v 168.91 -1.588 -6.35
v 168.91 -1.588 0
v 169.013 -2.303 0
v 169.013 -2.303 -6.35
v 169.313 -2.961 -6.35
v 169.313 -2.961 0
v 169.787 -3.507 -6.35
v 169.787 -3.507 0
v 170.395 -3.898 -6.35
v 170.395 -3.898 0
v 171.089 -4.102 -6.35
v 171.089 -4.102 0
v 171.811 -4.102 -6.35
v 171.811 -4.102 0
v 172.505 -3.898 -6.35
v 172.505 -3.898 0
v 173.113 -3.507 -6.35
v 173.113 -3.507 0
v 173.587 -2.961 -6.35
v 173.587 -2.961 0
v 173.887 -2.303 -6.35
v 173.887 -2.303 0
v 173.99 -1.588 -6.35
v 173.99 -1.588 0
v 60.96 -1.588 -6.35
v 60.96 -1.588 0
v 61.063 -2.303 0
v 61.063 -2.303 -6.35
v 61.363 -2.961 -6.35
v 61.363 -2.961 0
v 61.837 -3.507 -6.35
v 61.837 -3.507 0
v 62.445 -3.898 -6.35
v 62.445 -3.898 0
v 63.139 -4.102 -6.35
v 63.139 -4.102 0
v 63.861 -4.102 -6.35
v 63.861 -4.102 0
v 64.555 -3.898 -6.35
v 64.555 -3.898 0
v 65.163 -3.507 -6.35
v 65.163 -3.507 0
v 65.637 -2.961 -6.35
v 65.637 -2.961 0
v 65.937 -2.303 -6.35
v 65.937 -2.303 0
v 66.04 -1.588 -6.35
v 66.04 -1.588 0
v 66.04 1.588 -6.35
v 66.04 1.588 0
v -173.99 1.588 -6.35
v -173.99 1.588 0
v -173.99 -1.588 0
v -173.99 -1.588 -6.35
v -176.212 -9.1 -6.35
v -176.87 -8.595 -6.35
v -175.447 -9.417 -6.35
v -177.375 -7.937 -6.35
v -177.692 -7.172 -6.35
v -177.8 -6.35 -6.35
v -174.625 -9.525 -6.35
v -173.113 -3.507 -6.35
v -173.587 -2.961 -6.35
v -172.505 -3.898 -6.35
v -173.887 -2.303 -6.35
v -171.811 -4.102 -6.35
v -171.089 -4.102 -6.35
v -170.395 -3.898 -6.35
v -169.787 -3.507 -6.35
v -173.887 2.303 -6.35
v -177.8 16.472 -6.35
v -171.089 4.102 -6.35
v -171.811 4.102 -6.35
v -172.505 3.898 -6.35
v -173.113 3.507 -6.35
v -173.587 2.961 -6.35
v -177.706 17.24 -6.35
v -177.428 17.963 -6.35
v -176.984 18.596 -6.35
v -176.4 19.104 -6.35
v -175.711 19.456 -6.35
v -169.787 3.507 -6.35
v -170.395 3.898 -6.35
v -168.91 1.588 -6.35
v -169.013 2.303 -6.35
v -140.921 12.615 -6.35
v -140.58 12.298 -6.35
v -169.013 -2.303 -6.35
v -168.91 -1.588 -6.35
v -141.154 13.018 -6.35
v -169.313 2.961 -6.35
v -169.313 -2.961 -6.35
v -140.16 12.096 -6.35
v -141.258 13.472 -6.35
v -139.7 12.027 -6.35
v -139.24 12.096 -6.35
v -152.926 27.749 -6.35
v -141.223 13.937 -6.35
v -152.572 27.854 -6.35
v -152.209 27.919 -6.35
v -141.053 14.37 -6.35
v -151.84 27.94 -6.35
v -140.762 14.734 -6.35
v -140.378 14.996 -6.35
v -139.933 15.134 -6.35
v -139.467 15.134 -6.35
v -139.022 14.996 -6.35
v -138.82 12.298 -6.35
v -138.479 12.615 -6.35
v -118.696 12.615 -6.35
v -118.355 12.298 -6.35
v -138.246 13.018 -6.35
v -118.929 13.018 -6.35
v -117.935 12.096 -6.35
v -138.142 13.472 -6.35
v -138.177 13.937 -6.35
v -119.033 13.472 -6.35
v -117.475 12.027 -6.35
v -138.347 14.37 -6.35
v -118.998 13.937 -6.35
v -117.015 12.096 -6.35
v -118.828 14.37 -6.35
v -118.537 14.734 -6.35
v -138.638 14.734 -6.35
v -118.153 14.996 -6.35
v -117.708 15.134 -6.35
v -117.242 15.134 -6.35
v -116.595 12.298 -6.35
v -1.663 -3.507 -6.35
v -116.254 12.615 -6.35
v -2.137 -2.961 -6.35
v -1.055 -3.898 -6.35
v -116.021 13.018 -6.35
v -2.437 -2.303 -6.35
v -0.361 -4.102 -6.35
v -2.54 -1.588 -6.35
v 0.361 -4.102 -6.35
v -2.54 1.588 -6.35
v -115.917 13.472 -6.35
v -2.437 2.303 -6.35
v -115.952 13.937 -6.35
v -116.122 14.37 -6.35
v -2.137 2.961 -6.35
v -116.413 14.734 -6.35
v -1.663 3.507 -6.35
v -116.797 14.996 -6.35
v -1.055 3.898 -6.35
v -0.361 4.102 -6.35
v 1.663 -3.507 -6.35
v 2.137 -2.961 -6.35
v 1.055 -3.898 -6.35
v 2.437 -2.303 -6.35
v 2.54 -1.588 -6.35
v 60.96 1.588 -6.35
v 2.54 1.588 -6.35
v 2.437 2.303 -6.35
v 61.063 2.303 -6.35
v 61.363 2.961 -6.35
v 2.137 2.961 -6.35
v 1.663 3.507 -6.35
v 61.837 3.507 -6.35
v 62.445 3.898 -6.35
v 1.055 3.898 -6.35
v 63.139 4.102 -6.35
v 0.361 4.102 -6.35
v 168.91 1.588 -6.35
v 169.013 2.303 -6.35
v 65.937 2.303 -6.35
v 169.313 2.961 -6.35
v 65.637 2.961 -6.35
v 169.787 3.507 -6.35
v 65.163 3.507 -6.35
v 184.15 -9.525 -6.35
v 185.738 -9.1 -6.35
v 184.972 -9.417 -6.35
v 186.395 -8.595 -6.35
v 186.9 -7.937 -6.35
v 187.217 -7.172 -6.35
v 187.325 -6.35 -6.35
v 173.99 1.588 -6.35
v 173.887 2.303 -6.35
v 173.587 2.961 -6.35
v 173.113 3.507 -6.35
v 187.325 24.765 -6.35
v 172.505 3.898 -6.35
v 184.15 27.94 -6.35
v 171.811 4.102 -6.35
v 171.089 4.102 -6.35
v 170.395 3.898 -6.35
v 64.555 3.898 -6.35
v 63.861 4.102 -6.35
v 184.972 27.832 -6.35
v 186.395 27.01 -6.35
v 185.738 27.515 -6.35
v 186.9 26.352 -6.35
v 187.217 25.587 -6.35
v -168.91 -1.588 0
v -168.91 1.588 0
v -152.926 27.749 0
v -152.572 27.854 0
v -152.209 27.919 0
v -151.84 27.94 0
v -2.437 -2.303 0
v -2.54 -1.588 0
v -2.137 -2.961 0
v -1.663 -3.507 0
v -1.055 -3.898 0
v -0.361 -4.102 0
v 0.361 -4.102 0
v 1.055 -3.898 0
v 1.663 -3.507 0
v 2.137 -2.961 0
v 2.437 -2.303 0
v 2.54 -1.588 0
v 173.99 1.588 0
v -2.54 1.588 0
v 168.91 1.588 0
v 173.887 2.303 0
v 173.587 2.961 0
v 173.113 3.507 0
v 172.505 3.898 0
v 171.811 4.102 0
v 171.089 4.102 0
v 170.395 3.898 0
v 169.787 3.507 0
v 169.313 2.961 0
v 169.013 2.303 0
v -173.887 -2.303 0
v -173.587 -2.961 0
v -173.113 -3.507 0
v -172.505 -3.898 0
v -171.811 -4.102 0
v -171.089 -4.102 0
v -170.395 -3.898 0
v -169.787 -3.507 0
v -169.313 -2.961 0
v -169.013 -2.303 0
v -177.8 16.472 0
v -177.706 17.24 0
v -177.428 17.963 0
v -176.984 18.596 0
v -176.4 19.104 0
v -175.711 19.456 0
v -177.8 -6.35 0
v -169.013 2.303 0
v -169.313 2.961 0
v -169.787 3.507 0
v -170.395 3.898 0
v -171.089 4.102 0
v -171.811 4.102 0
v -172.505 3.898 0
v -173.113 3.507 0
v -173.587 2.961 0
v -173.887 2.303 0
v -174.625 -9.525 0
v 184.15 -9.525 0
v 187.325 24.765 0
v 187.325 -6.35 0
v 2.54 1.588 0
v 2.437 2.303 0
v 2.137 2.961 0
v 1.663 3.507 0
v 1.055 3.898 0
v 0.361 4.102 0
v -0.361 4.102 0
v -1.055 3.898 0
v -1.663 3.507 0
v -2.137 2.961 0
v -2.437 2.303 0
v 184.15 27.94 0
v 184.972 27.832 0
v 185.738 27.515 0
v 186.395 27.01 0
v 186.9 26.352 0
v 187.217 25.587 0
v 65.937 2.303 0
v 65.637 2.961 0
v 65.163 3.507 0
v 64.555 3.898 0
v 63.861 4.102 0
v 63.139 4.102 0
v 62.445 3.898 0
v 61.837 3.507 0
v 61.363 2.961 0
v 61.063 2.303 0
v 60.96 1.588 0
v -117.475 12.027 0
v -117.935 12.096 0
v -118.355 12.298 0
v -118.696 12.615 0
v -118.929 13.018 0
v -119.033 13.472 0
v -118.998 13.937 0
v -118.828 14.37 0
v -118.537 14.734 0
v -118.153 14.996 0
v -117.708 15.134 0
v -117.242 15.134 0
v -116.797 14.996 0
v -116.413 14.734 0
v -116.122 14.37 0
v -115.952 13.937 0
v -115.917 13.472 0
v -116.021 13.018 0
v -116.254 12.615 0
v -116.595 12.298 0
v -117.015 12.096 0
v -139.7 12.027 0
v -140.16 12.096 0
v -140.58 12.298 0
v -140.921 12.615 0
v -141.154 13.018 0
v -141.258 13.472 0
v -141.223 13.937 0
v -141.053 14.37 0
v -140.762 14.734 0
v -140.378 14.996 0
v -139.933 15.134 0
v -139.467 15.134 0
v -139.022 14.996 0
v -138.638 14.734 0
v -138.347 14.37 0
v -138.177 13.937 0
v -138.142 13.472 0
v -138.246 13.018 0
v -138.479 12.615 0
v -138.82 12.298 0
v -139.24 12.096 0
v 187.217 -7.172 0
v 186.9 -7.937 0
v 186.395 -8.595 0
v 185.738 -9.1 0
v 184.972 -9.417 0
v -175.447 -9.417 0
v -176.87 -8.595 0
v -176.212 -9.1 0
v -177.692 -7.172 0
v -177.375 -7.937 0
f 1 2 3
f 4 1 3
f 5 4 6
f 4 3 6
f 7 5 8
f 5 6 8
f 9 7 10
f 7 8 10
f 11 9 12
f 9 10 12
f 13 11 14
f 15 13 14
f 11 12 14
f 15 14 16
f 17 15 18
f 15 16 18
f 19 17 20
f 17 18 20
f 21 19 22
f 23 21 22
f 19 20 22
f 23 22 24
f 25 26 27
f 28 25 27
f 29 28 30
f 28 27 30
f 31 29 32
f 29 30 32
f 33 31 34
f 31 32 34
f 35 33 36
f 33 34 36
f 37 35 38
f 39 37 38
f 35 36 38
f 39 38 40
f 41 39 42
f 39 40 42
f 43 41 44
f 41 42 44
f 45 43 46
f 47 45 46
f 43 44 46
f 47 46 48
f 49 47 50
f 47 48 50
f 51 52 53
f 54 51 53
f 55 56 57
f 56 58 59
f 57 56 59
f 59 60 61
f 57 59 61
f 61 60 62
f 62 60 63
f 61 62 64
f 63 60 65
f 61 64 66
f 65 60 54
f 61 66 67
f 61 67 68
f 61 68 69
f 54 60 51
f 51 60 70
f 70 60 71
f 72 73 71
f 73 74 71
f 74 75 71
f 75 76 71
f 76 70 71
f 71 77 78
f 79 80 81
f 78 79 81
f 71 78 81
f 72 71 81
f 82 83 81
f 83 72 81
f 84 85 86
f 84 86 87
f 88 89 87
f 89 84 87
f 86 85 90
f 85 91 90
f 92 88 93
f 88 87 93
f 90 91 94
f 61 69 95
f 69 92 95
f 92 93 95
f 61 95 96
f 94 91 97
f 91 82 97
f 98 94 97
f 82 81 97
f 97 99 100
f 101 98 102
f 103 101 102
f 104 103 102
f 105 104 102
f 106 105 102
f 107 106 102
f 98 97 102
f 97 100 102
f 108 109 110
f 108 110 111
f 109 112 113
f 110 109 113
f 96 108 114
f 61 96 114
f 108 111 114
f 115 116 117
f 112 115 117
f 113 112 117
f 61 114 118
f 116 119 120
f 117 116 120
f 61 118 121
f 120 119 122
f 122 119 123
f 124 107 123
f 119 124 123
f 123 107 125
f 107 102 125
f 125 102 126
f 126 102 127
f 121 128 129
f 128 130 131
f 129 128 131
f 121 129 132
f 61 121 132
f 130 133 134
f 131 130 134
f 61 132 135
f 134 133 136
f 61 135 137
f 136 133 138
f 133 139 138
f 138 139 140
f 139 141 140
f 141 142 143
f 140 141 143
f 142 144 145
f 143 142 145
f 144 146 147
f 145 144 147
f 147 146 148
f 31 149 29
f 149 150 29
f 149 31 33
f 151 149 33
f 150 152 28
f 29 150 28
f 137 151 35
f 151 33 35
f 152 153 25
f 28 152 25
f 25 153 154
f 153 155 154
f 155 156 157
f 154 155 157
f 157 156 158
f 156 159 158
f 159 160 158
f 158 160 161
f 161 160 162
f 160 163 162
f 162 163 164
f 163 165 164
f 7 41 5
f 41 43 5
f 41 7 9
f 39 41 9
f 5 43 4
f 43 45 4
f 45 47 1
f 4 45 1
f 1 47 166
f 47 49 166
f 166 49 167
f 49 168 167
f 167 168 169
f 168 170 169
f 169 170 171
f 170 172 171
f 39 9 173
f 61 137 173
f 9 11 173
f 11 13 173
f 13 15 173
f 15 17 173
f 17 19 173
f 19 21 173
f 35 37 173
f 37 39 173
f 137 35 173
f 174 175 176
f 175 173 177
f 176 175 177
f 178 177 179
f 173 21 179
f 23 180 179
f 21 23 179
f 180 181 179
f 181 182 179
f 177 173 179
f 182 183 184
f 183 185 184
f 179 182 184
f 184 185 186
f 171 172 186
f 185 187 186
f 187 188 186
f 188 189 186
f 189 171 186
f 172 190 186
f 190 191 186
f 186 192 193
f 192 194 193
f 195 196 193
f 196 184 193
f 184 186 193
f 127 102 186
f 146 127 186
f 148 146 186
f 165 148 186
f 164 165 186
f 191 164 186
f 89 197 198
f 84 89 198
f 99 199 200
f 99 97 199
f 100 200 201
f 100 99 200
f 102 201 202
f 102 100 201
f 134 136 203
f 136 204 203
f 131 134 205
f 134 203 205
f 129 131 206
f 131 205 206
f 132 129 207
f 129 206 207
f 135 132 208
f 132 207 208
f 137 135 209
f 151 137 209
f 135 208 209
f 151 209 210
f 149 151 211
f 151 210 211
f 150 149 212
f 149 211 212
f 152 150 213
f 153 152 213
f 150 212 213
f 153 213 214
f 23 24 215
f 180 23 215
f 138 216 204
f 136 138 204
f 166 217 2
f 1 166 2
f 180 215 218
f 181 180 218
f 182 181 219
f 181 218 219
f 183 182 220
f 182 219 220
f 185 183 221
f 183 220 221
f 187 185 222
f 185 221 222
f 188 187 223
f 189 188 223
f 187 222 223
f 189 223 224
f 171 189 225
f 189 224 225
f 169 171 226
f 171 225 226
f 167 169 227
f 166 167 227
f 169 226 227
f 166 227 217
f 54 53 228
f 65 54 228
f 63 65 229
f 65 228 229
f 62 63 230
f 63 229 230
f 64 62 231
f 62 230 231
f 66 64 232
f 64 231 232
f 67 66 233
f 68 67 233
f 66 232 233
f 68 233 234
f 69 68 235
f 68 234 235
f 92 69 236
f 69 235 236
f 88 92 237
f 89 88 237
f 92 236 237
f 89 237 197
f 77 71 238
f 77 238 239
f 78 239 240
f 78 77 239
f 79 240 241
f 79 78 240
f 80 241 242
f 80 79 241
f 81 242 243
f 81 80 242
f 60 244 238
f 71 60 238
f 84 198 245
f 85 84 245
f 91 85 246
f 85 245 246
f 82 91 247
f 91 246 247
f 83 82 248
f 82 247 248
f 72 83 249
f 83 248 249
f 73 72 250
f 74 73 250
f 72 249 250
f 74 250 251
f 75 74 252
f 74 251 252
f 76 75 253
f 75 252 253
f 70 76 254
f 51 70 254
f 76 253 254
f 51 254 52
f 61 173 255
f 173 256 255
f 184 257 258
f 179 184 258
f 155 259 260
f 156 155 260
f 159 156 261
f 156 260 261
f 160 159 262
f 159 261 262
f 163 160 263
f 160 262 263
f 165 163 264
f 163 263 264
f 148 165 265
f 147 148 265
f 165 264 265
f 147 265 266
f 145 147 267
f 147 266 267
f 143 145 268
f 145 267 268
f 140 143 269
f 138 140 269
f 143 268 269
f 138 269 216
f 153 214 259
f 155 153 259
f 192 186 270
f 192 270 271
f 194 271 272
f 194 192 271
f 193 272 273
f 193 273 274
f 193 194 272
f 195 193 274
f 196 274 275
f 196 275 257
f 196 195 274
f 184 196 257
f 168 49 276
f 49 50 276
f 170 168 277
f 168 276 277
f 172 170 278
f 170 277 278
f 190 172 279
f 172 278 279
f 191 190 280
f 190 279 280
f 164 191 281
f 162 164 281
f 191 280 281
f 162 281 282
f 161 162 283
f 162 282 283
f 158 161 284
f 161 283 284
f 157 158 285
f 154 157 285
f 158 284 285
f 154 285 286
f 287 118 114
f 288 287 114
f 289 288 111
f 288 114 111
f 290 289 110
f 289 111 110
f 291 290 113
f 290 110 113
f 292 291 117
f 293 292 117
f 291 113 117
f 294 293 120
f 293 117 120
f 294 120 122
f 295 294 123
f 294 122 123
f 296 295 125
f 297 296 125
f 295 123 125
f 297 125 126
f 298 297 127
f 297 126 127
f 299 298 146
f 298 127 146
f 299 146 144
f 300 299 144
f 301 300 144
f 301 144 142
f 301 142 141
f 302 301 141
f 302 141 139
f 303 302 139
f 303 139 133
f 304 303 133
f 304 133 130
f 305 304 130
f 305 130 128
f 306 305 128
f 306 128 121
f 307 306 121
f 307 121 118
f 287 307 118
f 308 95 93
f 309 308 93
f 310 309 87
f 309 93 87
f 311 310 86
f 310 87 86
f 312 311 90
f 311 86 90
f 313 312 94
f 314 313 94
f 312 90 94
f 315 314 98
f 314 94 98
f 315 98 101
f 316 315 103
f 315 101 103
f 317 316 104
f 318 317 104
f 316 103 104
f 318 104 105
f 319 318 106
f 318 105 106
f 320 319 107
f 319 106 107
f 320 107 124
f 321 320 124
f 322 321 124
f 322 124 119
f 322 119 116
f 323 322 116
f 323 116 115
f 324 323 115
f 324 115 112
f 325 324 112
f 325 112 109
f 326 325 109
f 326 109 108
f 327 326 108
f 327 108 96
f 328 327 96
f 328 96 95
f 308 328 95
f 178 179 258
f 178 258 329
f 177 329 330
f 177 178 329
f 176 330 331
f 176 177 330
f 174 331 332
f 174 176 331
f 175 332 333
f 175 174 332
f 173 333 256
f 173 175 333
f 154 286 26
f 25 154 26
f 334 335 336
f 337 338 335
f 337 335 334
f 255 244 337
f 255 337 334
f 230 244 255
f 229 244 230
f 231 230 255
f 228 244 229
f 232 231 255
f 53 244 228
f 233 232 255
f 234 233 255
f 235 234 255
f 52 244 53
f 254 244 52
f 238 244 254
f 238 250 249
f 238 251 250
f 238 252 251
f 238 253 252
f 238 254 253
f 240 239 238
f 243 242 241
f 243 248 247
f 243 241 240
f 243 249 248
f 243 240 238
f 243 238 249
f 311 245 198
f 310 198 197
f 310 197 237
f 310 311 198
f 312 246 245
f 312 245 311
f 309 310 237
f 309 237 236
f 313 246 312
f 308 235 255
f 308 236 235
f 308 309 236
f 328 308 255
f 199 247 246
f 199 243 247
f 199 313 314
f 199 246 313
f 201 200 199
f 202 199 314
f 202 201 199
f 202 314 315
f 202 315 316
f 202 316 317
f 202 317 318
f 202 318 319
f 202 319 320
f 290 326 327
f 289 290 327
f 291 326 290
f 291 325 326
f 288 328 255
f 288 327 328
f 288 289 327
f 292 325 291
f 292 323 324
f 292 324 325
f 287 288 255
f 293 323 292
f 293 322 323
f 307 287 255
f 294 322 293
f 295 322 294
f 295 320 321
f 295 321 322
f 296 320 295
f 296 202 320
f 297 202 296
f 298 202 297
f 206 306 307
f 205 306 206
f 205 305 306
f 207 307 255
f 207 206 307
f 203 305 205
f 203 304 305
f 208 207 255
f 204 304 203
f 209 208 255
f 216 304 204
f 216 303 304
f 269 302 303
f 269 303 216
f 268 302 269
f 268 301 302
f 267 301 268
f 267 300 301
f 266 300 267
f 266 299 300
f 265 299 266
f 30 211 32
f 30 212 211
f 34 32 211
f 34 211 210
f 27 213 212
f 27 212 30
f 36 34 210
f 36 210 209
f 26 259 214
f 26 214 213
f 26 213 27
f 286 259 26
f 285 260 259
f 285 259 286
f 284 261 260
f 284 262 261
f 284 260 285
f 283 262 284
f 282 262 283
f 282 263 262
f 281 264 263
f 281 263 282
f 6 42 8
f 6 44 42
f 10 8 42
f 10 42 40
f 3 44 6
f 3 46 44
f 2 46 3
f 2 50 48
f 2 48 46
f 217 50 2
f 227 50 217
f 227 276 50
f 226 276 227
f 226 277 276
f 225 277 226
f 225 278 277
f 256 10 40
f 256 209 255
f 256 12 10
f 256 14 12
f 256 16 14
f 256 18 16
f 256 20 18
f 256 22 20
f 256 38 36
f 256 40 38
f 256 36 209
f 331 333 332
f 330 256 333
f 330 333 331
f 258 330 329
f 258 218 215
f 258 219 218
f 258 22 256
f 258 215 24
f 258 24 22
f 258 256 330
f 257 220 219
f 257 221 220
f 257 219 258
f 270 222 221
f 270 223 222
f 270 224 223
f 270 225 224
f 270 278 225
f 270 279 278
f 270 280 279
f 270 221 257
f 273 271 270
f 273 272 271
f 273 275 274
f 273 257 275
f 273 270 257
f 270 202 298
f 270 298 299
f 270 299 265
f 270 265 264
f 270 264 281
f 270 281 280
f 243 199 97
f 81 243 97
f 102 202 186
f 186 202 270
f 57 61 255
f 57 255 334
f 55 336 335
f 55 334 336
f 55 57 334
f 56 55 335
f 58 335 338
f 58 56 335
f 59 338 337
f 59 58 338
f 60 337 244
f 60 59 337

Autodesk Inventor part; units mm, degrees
ref_plane "YZ Plane" through (0, 0, 0) normal (1, 0, 0) x (0, 1, 0)
ref_plane "XZ Plane" through (0, 0, 0) normal (0, 1, 0) x (-1, 0, 0)
sketch "Sketch1" plane through (0, 0, 0) normal (0, 0, 1) x (1, 0, 0)
  line L0 (0, 35.433) -> (0, -17.018) projected
  line L1 (-250.825, 0) -> (260.35, 0) projected
  line L2 (187.325, -9.525) -> (-177.8, -9.525)
  line L3 (-177.8, -9.525) -> (-177.8, 27.94)
  line L4 (-177.8, 27.94) -> (187.325, 27.94)
  line L5 (187.325, 27.94) -> (187.325, -9.525)
  point P0 (0, 0)
  point P1 (-171.45, 0)
  point P2 (0, 0)
  point P3 (63.5, 0)
  point P4 (171.45, 0)
  point P5 (-139.7, 13.589)
  point P6 (-117.475, 13.589)
  dimension "d0" = 171.45
  dimension "d1" = 63.5
  dimension "d17" = 27.94
  dimension "d18" = 9.525
  dimension "d19" = 6.35
  dimension "d20" = 187.325
  dimension "d21" = 171.45
  dimension "d33" = 22.225
  dimension "d34" = 14.351
  dimension "d35" = 38.1
extrude "Extrusion1" add sketch "Sketch1" against normal blind 6.35
sketch "Sketch2" plane through (0, 0, -6.35) normal (0, 0, -1) x (-1, 0, 0)
  point P0 (0, 0)
  point P1 (171.45, 0)
  point P2 (0, 0)
  point P3 (-63.5, 0)
  point P4 (-171.45, 0)
chamfer "Chamfer1" distance 25.4 angle 20 1 edges at (-177.8, 27.94, -3.175) measured on face at (-56.0917, 27.94, -2.1167)
fillet "Fillet1" radius 3.175 5 edges at (187.325, 27.94, -3.175) (187.325, -9.525, -3.175) (-177.8, -9.525, -3.175) (-177.8, 18.6952, -3.175) (-152.4, 27.94, -3.175)
hole "Hole2" [suppressed]
sketch "Sketch3" plane through (0, 0, 0) normal (0, 0, 1) x (1, 0, 0)
  line L0 (-171.45, -1.5875) -> (-171.45, 1.5875) construction
  line L1 (-168.91, -1.5875) -> (-168.91, 1.5875)
  line L2 (-173.99, 1.5875) -> (-173.99, -1.5875)
  arc A0 (-173.99, -1.5875) -> (-168.91, -1.5875) centre (-171.45, -1.5875) ccw
  arc A1 (-168.91, 1.5875) -> (-173.99, 1.5875) centre (-171.45, 1.5875) ccw
  line L3 (0, -1.5875) -> (0, 1.5875) construction
  line L4 (2.54, -1.5875) -> (2.54, 1.5875)
  line L5 (-2.54, 1.5875) -> (-2.54, -1.5875)
  arc A2 (-2.54, -1.5875) -> (2.54, -1.5875) centre (0, -1.5875) ccw
  arc A3 (2.54, 1.5875) -> (-2.54, 1.5875) centre (0, 1.5875) ccw
  line L6 (63.5, -1.5875) -> (63.5, 1.5875) construction
  line L7 (66.04, -1.5875) -> (66.04, 1.5875)
  line L8 (60.96, 1.5875) -> (60.96, -1.5875)
  arc A4 (60.96, -1.5875) -> (66.04, -1.5875) centre (63.5, -1.5875) ccw
  arc A5 (66.04, 1.5875) -> (60.96, 1.5875) centre (63.5, 1.5875) ccw
  line L9 (171.45, -1.5875) -> (171.45, 1.5875) construction
  line L10 (173.99, -1.5875) -> (173.99, 1.5875)
  line L11 (168.91, 1.5875) -> (168.91, -1.5875)
  arc A6 (168.91, -1.5875) -> (173.99, -1.5875) centre (171.45, -1.5875) ccw
  arc A7 (173.99, 1.5875) -> (168.91, 1.5875) centre (171.45, 1.5875) ccw
  point P0 (0, 0)
  point P1 (-171.45, 0)
  point P2 (0, 0)
  point P3 (63.5, 0)
  point P4 (171.45, 0)
  dimension "d29" = 2.54
  dimension "d30" = 3.175
extrude "Extrusion2" cut sketch "Sketch3" against normal up to next
hole "Hole3" at (-139.7, 13.589, 0) at (-117.475, 13.589, 0) direction (0, 0, -1) diameter 3.1242 end through all
